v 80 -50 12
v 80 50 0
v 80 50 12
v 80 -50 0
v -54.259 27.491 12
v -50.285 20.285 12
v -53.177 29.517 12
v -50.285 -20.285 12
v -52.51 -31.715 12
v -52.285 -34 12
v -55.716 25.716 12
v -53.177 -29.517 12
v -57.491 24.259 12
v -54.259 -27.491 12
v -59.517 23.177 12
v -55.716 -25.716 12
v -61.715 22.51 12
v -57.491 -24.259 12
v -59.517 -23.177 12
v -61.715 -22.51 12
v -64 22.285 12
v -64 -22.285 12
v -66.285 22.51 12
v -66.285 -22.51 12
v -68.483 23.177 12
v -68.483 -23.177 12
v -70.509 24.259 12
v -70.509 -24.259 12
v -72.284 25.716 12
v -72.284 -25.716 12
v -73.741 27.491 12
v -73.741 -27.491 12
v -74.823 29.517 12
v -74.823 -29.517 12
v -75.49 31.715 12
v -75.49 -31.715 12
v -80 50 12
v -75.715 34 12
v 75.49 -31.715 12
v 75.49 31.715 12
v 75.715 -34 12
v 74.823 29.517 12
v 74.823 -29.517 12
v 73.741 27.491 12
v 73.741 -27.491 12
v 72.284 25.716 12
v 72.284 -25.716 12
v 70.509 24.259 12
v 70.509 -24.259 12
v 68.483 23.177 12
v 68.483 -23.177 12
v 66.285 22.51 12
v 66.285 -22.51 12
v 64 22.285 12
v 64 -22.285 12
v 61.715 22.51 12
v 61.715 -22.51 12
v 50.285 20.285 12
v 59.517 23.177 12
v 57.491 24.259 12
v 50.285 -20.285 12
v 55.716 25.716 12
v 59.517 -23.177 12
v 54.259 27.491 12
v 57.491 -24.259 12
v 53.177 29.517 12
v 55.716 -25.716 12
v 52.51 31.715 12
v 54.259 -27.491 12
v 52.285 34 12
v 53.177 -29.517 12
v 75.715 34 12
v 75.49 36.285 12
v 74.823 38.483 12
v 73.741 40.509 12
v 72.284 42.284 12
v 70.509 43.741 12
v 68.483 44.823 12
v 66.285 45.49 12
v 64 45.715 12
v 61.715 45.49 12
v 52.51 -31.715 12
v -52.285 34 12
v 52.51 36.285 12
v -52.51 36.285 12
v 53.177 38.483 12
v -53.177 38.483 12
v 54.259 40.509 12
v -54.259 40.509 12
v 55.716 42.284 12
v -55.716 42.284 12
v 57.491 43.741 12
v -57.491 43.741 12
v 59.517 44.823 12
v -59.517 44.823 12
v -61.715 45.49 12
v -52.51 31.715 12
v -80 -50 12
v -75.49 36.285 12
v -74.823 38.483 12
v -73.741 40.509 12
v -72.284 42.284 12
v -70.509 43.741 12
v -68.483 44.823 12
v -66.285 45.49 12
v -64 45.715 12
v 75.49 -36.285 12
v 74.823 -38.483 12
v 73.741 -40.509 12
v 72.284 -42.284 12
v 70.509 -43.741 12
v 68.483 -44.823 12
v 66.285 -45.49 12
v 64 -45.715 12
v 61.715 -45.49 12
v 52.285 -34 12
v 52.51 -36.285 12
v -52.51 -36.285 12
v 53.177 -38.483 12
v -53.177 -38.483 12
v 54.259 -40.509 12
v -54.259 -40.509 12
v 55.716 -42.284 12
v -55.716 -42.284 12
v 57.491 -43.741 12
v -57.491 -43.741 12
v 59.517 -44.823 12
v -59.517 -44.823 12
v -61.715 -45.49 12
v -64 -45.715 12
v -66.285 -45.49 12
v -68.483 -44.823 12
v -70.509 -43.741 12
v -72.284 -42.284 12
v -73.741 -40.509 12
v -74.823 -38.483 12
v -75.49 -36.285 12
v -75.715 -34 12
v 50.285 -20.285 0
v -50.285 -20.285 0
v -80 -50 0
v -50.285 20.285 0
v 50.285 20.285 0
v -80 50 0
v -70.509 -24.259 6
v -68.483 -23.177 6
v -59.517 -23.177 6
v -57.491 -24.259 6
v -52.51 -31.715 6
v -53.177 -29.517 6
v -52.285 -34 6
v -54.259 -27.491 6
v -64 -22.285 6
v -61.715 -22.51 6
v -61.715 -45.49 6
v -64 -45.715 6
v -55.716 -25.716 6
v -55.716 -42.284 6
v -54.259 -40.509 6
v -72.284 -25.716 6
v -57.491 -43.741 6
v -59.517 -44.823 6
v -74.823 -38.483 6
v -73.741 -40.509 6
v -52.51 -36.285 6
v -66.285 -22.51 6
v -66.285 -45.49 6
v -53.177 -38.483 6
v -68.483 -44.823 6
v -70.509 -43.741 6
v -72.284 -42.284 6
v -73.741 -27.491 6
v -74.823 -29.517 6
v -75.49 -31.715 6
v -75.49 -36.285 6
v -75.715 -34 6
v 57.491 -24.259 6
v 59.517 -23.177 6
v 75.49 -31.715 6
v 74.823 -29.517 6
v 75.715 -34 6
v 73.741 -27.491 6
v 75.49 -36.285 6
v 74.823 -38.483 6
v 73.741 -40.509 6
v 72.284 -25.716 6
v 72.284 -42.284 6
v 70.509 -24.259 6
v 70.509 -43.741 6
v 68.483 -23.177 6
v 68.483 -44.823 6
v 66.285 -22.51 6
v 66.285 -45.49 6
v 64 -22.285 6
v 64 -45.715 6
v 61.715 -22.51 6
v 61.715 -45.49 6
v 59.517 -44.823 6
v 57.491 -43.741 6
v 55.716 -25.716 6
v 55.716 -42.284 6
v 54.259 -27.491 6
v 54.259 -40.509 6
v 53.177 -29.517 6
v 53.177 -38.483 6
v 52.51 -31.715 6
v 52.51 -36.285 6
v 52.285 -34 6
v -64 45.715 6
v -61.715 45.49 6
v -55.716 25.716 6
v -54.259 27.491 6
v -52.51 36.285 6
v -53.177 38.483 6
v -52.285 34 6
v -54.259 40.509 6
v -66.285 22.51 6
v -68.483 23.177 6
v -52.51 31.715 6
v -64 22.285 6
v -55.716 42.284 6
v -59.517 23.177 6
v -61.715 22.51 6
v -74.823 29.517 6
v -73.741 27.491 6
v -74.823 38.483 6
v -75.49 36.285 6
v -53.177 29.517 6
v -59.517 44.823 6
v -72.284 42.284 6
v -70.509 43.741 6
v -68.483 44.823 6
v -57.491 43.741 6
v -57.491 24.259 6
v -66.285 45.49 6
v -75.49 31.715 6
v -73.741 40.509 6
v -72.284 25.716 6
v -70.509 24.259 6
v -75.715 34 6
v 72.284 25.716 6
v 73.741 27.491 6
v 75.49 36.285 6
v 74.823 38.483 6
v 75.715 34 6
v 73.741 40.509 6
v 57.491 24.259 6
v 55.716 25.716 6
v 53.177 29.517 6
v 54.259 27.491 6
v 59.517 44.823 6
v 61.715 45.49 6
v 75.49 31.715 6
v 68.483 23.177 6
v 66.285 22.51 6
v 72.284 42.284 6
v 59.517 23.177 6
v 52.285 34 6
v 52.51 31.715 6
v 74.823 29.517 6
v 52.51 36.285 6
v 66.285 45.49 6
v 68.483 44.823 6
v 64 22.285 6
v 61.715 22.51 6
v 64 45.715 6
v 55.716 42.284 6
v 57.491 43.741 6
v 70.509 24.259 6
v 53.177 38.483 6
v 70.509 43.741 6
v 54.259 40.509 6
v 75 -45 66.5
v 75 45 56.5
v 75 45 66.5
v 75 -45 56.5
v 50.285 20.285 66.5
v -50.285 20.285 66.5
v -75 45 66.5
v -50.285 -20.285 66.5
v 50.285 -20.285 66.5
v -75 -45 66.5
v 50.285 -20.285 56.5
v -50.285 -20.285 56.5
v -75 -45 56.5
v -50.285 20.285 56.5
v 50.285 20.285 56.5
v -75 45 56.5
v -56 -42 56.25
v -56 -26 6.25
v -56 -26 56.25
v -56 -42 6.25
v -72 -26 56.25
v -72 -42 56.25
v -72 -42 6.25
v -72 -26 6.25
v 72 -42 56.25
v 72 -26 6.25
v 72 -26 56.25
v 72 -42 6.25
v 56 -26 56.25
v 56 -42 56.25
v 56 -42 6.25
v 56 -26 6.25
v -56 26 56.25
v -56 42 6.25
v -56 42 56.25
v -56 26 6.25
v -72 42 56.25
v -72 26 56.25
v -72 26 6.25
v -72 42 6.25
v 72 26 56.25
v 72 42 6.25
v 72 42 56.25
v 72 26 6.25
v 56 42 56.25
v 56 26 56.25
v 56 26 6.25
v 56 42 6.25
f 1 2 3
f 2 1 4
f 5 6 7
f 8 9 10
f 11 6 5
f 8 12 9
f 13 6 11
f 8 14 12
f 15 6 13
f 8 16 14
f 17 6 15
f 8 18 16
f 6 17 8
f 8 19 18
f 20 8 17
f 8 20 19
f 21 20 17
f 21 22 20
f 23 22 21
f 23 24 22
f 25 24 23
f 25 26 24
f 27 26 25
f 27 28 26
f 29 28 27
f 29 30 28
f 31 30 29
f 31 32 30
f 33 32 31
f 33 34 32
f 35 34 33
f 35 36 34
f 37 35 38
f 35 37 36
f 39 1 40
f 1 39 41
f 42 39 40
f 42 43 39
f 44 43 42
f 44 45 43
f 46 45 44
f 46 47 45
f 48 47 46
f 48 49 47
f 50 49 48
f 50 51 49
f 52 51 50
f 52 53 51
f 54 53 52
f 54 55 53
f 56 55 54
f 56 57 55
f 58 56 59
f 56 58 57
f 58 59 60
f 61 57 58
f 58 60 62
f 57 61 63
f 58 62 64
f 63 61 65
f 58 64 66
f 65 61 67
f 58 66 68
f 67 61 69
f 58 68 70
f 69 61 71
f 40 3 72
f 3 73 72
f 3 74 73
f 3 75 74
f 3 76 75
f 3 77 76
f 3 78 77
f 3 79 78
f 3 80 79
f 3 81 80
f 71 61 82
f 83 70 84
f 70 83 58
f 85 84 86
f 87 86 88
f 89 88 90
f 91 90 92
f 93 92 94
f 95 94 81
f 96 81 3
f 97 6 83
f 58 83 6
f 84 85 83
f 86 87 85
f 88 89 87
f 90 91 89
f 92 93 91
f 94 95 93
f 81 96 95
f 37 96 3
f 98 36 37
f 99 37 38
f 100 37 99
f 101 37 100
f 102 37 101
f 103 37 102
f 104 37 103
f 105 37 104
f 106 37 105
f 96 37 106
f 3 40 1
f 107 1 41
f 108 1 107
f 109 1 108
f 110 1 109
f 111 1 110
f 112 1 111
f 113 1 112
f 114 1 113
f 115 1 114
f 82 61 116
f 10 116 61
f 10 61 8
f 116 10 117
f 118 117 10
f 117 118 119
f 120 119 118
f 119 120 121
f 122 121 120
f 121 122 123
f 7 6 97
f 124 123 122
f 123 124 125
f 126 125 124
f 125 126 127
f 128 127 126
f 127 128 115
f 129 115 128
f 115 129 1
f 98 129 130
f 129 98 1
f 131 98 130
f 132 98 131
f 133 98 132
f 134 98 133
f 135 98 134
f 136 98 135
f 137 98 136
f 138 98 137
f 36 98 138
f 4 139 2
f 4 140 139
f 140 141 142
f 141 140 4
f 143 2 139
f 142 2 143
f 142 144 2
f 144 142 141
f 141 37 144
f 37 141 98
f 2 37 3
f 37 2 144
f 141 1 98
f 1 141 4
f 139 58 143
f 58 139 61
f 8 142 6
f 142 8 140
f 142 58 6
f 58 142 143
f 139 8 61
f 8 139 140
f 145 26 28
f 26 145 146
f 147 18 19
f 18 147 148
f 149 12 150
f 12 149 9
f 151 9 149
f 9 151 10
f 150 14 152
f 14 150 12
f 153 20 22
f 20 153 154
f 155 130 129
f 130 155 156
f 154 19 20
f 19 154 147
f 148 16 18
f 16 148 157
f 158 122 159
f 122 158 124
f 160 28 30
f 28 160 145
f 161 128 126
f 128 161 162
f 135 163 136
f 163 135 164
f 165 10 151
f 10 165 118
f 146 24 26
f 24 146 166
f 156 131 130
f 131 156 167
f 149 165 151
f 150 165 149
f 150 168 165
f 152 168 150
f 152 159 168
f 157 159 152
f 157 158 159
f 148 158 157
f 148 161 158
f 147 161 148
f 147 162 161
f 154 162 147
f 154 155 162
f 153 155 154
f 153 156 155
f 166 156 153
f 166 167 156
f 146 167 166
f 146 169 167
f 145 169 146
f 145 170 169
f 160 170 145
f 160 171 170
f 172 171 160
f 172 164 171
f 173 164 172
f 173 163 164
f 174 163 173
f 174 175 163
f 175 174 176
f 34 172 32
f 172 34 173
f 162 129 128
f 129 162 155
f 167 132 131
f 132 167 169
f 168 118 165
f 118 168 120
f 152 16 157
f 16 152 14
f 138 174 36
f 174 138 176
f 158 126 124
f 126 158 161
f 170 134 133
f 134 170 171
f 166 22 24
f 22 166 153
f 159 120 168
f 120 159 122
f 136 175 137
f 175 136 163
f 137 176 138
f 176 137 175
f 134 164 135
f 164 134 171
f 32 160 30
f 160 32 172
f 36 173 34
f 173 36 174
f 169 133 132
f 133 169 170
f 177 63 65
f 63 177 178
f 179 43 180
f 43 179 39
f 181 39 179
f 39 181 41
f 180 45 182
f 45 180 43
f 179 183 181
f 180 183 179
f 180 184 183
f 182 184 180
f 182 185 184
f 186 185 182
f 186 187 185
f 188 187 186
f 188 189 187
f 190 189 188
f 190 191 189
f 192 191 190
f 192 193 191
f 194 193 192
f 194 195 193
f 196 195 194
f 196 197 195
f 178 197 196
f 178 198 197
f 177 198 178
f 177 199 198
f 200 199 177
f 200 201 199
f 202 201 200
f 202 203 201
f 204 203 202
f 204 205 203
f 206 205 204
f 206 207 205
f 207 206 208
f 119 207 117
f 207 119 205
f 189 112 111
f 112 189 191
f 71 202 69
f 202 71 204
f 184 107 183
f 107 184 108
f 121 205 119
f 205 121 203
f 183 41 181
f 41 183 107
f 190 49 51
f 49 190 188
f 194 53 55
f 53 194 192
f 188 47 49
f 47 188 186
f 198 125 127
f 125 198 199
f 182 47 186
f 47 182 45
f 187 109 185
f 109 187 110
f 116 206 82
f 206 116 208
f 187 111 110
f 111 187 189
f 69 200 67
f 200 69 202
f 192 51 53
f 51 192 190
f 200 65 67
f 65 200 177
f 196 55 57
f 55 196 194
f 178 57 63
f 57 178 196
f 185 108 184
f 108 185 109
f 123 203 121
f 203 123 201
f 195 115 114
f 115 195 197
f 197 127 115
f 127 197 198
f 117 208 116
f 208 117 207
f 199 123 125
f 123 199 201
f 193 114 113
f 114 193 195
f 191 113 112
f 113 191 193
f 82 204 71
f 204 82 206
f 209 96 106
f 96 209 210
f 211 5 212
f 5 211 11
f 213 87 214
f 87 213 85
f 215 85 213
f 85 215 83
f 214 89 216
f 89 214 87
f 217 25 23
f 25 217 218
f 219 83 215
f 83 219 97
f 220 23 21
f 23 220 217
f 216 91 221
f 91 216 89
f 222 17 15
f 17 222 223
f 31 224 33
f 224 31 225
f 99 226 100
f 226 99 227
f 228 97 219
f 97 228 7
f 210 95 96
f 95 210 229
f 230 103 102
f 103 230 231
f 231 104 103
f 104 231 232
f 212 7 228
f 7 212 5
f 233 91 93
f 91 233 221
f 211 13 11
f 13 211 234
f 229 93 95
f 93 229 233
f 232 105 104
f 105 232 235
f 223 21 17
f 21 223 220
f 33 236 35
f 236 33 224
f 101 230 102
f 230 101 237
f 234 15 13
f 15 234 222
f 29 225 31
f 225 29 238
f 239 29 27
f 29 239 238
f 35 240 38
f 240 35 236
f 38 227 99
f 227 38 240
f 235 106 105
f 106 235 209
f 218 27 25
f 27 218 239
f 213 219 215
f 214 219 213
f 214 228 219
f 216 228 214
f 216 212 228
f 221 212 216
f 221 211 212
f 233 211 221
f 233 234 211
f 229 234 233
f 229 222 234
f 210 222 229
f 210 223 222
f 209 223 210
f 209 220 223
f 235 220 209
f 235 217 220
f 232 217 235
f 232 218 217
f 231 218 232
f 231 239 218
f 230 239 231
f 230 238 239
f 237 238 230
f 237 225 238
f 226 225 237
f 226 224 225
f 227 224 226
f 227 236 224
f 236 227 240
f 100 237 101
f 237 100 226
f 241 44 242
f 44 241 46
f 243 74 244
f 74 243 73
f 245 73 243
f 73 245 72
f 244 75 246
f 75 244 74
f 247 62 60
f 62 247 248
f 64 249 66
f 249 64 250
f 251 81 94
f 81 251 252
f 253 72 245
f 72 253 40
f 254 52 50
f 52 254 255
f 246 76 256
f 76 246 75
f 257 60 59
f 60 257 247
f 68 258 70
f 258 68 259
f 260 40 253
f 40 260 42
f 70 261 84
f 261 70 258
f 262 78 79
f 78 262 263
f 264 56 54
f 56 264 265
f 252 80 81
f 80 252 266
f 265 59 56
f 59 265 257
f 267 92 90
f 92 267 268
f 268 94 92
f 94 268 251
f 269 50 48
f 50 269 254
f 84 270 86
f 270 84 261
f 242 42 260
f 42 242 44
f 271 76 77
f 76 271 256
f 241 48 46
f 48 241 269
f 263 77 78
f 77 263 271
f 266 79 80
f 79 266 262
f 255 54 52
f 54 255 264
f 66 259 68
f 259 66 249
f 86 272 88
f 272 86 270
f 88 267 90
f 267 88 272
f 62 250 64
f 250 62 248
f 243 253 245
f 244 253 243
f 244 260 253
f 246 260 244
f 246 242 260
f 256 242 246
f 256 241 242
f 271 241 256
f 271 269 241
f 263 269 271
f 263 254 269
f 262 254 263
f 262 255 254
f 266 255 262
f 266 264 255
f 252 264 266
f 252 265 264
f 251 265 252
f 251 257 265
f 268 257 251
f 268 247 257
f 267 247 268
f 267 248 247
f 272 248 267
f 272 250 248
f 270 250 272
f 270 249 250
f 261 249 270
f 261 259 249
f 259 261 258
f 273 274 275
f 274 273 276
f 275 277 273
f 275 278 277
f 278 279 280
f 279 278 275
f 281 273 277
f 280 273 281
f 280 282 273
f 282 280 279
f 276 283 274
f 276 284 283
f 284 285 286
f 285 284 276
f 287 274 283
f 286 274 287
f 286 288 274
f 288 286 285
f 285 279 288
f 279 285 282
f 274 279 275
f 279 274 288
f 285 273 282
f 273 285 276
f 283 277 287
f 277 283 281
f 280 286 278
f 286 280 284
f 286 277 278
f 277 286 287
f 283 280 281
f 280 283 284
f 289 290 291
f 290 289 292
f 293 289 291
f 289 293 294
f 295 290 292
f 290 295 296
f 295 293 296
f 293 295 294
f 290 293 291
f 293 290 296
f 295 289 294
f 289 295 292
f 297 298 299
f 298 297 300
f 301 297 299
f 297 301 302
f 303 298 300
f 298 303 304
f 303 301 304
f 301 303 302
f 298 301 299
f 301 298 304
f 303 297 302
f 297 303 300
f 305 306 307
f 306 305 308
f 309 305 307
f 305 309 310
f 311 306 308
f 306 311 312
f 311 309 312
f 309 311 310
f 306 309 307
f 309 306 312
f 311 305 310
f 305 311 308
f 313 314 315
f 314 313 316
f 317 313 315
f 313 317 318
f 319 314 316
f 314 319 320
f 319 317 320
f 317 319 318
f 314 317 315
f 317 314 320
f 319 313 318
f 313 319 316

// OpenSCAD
$fn = 32;

// ------------------------------------------------------------------------
// Frame cube: base 160 x 100 mm, posts 50 mm tall
// Every part is its own module, assembly() places every instance.
// ------------------------------------------------------------------------

// --- part 1 ---
module base_frame() {
  difference() {
    translate([-80, -50, 0]) cube([160, 100, 12]);
    translate([-50.285, -20.285, -1]) cube([100.57, 40.57, 14]);
    translate([-64, -34, 6]) cylinder(h = 7, d = 23.43);
    translate([64, -34, 6]) cylinder(h = 7, d = 23.43);
    translate([-64, 34, 6]) cylinder(h = 7, d = 23.43);
    translate([64, 34, 6]) cylinder(h = 7, d = 23.43);
  }
}

// --- part 2 ---
module corner_post() {
  translate([-8, -8, 0]) cube([16, 16, 50]);
}

// --- part 3 ---
module top_frame() {
  difference() {
    translate([-75, -45, 0]) cube([150, 90, 10]);
    translate([-50.285, -20.285, -1]) cube([100.57, 40.57, 12]);
  }
}

// --- assembly ---
module assembly() {
  color([0.80, 0.24, 0.20]) translate([0, 0, 0]) rotate([0, 0, 0]) base_frame();
  color([0.20, 0.45, 0.75]) translate([-64, -34, 6.25]) rotate([0, 0, 0]) corner_post();
  color([0.25, 0.62, 0.32]) translate([64, -34, 6.25]) rotate([0, 0, 0]) corner_post();
  color([0.92, 0.70, 0.18]) translate([-64, 34, 6.25]) rotate([0, 0, 0]) corner_post();
  color([0.58, 0.35, 0.70]) translate([64, 34, 6.25]) rotate([0, 0, 0]) corner_post();
  color([0.16, 0.66, 0.66]) translate([0, 0, 56.5]) rotate([0, 0, 0]) top_frame();
}

assembly();
